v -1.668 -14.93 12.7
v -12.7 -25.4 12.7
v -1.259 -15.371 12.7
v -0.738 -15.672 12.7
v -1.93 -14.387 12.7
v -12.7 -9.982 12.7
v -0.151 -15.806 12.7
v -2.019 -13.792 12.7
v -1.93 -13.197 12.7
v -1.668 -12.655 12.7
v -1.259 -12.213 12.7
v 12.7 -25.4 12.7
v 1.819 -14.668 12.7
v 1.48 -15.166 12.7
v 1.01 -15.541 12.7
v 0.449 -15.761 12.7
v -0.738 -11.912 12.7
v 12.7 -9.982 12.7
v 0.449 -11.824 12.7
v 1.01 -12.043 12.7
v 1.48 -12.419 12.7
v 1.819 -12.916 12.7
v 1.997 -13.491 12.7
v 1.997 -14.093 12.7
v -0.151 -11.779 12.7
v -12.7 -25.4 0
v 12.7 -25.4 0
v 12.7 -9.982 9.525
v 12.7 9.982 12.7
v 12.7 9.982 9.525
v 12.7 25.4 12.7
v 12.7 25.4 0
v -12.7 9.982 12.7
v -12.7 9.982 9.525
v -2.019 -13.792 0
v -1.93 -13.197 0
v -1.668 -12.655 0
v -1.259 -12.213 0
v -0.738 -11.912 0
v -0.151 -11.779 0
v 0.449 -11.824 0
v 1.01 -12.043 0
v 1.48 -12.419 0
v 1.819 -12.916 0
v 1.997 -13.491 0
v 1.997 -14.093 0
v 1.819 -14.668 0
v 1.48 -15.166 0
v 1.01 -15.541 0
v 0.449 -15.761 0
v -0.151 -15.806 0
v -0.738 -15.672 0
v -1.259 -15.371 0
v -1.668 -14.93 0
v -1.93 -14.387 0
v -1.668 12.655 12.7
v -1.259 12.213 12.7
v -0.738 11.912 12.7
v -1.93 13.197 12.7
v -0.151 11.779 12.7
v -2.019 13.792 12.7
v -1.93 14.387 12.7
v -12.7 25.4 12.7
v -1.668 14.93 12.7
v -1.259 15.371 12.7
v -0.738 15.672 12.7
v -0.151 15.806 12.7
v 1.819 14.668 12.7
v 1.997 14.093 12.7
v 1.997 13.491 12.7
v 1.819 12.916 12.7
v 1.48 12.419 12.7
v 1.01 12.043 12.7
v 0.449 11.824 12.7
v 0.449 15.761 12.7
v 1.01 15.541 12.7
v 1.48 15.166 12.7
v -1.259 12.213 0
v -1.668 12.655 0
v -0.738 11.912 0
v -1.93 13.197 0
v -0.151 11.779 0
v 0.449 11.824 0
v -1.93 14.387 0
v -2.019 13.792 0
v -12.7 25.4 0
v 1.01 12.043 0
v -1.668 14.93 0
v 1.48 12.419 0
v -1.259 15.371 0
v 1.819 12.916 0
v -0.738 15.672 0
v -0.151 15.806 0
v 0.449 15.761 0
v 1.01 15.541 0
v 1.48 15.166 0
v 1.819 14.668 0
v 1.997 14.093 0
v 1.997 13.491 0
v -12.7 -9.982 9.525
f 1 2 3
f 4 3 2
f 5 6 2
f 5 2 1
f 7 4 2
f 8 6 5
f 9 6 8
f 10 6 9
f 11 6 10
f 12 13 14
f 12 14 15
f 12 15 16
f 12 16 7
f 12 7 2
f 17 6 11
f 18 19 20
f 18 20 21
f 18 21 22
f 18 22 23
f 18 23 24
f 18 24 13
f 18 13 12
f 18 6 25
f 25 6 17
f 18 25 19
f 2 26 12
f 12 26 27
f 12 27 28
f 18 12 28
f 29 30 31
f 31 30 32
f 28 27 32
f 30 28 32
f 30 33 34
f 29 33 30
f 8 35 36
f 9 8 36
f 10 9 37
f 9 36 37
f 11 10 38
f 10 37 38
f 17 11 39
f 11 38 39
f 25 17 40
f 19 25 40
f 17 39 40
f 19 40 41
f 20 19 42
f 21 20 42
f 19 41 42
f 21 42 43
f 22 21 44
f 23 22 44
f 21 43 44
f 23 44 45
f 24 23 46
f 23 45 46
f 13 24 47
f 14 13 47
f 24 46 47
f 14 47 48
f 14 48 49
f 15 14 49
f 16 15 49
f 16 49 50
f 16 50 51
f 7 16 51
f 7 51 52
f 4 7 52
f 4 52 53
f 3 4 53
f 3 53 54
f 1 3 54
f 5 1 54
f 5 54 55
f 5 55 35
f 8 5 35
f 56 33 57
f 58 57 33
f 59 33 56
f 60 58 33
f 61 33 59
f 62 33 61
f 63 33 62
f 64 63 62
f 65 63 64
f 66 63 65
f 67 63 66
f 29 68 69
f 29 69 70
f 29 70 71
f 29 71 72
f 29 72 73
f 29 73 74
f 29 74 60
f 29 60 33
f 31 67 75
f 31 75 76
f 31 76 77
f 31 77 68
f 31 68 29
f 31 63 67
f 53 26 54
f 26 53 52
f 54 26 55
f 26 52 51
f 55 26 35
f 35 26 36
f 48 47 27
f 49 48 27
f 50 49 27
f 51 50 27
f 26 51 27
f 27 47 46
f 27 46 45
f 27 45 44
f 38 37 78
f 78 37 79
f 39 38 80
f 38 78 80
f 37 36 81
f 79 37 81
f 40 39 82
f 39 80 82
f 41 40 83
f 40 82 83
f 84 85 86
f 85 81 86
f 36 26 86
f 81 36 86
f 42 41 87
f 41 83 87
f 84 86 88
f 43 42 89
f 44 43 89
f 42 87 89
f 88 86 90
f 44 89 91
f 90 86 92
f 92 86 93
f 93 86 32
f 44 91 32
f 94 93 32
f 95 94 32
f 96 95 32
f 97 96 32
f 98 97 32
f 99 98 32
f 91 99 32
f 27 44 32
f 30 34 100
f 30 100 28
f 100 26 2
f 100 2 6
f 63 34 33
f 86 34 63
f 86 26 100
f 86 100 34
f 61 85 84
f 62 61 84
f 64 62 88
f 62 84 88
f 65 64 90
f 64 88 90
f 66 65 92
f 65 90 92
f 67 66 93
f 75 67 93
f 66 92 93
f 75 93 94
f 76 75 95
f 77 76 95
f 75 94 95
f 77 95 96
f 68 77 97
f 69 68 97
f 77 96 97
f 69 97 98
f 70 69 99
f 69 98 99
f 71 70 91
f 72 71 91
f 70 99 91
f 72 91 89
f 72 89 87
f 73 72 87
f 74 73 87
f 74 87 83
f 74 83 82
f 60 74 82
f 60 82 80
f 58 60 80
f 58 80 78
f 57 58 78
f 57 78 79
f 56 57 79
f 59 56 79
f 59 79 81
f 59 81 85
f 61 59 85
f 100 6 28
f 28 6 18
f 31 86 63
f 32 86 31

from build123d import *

# Parameters (mm, degrees)
F0_W     = 25.4
F0_H     = 50.8
F1_DEPTH = 12.7
F2_W     = 25.4
F2_H     = 19.9644
F3_DEPTH = 3.175
F5_D     = 4.0386


with BuildPart() as f1:
    # F0 (on Top) → F1 (new body)
    with BuildSketch(Plane.XY):
        Rectangle(F0_W, F0_H)
    extrude(amount=F1_DEPTH)

    # F2 (on face) → F3 (cut)
    with BuildSketch(Plane.XY.offset(12.7)):
        Rectangle(F2_W, F2_H)
    extrude(amount=-F3_DEPTH, mode=Mode.SUBTRACT)

    # F5 (through all)
    with Locations(Plane.XY.offset(12.7)):
        with Locations((0, 13.7922), (0, -13.7922)):
            Hole(F5_D / 2)


solid = f1.part
